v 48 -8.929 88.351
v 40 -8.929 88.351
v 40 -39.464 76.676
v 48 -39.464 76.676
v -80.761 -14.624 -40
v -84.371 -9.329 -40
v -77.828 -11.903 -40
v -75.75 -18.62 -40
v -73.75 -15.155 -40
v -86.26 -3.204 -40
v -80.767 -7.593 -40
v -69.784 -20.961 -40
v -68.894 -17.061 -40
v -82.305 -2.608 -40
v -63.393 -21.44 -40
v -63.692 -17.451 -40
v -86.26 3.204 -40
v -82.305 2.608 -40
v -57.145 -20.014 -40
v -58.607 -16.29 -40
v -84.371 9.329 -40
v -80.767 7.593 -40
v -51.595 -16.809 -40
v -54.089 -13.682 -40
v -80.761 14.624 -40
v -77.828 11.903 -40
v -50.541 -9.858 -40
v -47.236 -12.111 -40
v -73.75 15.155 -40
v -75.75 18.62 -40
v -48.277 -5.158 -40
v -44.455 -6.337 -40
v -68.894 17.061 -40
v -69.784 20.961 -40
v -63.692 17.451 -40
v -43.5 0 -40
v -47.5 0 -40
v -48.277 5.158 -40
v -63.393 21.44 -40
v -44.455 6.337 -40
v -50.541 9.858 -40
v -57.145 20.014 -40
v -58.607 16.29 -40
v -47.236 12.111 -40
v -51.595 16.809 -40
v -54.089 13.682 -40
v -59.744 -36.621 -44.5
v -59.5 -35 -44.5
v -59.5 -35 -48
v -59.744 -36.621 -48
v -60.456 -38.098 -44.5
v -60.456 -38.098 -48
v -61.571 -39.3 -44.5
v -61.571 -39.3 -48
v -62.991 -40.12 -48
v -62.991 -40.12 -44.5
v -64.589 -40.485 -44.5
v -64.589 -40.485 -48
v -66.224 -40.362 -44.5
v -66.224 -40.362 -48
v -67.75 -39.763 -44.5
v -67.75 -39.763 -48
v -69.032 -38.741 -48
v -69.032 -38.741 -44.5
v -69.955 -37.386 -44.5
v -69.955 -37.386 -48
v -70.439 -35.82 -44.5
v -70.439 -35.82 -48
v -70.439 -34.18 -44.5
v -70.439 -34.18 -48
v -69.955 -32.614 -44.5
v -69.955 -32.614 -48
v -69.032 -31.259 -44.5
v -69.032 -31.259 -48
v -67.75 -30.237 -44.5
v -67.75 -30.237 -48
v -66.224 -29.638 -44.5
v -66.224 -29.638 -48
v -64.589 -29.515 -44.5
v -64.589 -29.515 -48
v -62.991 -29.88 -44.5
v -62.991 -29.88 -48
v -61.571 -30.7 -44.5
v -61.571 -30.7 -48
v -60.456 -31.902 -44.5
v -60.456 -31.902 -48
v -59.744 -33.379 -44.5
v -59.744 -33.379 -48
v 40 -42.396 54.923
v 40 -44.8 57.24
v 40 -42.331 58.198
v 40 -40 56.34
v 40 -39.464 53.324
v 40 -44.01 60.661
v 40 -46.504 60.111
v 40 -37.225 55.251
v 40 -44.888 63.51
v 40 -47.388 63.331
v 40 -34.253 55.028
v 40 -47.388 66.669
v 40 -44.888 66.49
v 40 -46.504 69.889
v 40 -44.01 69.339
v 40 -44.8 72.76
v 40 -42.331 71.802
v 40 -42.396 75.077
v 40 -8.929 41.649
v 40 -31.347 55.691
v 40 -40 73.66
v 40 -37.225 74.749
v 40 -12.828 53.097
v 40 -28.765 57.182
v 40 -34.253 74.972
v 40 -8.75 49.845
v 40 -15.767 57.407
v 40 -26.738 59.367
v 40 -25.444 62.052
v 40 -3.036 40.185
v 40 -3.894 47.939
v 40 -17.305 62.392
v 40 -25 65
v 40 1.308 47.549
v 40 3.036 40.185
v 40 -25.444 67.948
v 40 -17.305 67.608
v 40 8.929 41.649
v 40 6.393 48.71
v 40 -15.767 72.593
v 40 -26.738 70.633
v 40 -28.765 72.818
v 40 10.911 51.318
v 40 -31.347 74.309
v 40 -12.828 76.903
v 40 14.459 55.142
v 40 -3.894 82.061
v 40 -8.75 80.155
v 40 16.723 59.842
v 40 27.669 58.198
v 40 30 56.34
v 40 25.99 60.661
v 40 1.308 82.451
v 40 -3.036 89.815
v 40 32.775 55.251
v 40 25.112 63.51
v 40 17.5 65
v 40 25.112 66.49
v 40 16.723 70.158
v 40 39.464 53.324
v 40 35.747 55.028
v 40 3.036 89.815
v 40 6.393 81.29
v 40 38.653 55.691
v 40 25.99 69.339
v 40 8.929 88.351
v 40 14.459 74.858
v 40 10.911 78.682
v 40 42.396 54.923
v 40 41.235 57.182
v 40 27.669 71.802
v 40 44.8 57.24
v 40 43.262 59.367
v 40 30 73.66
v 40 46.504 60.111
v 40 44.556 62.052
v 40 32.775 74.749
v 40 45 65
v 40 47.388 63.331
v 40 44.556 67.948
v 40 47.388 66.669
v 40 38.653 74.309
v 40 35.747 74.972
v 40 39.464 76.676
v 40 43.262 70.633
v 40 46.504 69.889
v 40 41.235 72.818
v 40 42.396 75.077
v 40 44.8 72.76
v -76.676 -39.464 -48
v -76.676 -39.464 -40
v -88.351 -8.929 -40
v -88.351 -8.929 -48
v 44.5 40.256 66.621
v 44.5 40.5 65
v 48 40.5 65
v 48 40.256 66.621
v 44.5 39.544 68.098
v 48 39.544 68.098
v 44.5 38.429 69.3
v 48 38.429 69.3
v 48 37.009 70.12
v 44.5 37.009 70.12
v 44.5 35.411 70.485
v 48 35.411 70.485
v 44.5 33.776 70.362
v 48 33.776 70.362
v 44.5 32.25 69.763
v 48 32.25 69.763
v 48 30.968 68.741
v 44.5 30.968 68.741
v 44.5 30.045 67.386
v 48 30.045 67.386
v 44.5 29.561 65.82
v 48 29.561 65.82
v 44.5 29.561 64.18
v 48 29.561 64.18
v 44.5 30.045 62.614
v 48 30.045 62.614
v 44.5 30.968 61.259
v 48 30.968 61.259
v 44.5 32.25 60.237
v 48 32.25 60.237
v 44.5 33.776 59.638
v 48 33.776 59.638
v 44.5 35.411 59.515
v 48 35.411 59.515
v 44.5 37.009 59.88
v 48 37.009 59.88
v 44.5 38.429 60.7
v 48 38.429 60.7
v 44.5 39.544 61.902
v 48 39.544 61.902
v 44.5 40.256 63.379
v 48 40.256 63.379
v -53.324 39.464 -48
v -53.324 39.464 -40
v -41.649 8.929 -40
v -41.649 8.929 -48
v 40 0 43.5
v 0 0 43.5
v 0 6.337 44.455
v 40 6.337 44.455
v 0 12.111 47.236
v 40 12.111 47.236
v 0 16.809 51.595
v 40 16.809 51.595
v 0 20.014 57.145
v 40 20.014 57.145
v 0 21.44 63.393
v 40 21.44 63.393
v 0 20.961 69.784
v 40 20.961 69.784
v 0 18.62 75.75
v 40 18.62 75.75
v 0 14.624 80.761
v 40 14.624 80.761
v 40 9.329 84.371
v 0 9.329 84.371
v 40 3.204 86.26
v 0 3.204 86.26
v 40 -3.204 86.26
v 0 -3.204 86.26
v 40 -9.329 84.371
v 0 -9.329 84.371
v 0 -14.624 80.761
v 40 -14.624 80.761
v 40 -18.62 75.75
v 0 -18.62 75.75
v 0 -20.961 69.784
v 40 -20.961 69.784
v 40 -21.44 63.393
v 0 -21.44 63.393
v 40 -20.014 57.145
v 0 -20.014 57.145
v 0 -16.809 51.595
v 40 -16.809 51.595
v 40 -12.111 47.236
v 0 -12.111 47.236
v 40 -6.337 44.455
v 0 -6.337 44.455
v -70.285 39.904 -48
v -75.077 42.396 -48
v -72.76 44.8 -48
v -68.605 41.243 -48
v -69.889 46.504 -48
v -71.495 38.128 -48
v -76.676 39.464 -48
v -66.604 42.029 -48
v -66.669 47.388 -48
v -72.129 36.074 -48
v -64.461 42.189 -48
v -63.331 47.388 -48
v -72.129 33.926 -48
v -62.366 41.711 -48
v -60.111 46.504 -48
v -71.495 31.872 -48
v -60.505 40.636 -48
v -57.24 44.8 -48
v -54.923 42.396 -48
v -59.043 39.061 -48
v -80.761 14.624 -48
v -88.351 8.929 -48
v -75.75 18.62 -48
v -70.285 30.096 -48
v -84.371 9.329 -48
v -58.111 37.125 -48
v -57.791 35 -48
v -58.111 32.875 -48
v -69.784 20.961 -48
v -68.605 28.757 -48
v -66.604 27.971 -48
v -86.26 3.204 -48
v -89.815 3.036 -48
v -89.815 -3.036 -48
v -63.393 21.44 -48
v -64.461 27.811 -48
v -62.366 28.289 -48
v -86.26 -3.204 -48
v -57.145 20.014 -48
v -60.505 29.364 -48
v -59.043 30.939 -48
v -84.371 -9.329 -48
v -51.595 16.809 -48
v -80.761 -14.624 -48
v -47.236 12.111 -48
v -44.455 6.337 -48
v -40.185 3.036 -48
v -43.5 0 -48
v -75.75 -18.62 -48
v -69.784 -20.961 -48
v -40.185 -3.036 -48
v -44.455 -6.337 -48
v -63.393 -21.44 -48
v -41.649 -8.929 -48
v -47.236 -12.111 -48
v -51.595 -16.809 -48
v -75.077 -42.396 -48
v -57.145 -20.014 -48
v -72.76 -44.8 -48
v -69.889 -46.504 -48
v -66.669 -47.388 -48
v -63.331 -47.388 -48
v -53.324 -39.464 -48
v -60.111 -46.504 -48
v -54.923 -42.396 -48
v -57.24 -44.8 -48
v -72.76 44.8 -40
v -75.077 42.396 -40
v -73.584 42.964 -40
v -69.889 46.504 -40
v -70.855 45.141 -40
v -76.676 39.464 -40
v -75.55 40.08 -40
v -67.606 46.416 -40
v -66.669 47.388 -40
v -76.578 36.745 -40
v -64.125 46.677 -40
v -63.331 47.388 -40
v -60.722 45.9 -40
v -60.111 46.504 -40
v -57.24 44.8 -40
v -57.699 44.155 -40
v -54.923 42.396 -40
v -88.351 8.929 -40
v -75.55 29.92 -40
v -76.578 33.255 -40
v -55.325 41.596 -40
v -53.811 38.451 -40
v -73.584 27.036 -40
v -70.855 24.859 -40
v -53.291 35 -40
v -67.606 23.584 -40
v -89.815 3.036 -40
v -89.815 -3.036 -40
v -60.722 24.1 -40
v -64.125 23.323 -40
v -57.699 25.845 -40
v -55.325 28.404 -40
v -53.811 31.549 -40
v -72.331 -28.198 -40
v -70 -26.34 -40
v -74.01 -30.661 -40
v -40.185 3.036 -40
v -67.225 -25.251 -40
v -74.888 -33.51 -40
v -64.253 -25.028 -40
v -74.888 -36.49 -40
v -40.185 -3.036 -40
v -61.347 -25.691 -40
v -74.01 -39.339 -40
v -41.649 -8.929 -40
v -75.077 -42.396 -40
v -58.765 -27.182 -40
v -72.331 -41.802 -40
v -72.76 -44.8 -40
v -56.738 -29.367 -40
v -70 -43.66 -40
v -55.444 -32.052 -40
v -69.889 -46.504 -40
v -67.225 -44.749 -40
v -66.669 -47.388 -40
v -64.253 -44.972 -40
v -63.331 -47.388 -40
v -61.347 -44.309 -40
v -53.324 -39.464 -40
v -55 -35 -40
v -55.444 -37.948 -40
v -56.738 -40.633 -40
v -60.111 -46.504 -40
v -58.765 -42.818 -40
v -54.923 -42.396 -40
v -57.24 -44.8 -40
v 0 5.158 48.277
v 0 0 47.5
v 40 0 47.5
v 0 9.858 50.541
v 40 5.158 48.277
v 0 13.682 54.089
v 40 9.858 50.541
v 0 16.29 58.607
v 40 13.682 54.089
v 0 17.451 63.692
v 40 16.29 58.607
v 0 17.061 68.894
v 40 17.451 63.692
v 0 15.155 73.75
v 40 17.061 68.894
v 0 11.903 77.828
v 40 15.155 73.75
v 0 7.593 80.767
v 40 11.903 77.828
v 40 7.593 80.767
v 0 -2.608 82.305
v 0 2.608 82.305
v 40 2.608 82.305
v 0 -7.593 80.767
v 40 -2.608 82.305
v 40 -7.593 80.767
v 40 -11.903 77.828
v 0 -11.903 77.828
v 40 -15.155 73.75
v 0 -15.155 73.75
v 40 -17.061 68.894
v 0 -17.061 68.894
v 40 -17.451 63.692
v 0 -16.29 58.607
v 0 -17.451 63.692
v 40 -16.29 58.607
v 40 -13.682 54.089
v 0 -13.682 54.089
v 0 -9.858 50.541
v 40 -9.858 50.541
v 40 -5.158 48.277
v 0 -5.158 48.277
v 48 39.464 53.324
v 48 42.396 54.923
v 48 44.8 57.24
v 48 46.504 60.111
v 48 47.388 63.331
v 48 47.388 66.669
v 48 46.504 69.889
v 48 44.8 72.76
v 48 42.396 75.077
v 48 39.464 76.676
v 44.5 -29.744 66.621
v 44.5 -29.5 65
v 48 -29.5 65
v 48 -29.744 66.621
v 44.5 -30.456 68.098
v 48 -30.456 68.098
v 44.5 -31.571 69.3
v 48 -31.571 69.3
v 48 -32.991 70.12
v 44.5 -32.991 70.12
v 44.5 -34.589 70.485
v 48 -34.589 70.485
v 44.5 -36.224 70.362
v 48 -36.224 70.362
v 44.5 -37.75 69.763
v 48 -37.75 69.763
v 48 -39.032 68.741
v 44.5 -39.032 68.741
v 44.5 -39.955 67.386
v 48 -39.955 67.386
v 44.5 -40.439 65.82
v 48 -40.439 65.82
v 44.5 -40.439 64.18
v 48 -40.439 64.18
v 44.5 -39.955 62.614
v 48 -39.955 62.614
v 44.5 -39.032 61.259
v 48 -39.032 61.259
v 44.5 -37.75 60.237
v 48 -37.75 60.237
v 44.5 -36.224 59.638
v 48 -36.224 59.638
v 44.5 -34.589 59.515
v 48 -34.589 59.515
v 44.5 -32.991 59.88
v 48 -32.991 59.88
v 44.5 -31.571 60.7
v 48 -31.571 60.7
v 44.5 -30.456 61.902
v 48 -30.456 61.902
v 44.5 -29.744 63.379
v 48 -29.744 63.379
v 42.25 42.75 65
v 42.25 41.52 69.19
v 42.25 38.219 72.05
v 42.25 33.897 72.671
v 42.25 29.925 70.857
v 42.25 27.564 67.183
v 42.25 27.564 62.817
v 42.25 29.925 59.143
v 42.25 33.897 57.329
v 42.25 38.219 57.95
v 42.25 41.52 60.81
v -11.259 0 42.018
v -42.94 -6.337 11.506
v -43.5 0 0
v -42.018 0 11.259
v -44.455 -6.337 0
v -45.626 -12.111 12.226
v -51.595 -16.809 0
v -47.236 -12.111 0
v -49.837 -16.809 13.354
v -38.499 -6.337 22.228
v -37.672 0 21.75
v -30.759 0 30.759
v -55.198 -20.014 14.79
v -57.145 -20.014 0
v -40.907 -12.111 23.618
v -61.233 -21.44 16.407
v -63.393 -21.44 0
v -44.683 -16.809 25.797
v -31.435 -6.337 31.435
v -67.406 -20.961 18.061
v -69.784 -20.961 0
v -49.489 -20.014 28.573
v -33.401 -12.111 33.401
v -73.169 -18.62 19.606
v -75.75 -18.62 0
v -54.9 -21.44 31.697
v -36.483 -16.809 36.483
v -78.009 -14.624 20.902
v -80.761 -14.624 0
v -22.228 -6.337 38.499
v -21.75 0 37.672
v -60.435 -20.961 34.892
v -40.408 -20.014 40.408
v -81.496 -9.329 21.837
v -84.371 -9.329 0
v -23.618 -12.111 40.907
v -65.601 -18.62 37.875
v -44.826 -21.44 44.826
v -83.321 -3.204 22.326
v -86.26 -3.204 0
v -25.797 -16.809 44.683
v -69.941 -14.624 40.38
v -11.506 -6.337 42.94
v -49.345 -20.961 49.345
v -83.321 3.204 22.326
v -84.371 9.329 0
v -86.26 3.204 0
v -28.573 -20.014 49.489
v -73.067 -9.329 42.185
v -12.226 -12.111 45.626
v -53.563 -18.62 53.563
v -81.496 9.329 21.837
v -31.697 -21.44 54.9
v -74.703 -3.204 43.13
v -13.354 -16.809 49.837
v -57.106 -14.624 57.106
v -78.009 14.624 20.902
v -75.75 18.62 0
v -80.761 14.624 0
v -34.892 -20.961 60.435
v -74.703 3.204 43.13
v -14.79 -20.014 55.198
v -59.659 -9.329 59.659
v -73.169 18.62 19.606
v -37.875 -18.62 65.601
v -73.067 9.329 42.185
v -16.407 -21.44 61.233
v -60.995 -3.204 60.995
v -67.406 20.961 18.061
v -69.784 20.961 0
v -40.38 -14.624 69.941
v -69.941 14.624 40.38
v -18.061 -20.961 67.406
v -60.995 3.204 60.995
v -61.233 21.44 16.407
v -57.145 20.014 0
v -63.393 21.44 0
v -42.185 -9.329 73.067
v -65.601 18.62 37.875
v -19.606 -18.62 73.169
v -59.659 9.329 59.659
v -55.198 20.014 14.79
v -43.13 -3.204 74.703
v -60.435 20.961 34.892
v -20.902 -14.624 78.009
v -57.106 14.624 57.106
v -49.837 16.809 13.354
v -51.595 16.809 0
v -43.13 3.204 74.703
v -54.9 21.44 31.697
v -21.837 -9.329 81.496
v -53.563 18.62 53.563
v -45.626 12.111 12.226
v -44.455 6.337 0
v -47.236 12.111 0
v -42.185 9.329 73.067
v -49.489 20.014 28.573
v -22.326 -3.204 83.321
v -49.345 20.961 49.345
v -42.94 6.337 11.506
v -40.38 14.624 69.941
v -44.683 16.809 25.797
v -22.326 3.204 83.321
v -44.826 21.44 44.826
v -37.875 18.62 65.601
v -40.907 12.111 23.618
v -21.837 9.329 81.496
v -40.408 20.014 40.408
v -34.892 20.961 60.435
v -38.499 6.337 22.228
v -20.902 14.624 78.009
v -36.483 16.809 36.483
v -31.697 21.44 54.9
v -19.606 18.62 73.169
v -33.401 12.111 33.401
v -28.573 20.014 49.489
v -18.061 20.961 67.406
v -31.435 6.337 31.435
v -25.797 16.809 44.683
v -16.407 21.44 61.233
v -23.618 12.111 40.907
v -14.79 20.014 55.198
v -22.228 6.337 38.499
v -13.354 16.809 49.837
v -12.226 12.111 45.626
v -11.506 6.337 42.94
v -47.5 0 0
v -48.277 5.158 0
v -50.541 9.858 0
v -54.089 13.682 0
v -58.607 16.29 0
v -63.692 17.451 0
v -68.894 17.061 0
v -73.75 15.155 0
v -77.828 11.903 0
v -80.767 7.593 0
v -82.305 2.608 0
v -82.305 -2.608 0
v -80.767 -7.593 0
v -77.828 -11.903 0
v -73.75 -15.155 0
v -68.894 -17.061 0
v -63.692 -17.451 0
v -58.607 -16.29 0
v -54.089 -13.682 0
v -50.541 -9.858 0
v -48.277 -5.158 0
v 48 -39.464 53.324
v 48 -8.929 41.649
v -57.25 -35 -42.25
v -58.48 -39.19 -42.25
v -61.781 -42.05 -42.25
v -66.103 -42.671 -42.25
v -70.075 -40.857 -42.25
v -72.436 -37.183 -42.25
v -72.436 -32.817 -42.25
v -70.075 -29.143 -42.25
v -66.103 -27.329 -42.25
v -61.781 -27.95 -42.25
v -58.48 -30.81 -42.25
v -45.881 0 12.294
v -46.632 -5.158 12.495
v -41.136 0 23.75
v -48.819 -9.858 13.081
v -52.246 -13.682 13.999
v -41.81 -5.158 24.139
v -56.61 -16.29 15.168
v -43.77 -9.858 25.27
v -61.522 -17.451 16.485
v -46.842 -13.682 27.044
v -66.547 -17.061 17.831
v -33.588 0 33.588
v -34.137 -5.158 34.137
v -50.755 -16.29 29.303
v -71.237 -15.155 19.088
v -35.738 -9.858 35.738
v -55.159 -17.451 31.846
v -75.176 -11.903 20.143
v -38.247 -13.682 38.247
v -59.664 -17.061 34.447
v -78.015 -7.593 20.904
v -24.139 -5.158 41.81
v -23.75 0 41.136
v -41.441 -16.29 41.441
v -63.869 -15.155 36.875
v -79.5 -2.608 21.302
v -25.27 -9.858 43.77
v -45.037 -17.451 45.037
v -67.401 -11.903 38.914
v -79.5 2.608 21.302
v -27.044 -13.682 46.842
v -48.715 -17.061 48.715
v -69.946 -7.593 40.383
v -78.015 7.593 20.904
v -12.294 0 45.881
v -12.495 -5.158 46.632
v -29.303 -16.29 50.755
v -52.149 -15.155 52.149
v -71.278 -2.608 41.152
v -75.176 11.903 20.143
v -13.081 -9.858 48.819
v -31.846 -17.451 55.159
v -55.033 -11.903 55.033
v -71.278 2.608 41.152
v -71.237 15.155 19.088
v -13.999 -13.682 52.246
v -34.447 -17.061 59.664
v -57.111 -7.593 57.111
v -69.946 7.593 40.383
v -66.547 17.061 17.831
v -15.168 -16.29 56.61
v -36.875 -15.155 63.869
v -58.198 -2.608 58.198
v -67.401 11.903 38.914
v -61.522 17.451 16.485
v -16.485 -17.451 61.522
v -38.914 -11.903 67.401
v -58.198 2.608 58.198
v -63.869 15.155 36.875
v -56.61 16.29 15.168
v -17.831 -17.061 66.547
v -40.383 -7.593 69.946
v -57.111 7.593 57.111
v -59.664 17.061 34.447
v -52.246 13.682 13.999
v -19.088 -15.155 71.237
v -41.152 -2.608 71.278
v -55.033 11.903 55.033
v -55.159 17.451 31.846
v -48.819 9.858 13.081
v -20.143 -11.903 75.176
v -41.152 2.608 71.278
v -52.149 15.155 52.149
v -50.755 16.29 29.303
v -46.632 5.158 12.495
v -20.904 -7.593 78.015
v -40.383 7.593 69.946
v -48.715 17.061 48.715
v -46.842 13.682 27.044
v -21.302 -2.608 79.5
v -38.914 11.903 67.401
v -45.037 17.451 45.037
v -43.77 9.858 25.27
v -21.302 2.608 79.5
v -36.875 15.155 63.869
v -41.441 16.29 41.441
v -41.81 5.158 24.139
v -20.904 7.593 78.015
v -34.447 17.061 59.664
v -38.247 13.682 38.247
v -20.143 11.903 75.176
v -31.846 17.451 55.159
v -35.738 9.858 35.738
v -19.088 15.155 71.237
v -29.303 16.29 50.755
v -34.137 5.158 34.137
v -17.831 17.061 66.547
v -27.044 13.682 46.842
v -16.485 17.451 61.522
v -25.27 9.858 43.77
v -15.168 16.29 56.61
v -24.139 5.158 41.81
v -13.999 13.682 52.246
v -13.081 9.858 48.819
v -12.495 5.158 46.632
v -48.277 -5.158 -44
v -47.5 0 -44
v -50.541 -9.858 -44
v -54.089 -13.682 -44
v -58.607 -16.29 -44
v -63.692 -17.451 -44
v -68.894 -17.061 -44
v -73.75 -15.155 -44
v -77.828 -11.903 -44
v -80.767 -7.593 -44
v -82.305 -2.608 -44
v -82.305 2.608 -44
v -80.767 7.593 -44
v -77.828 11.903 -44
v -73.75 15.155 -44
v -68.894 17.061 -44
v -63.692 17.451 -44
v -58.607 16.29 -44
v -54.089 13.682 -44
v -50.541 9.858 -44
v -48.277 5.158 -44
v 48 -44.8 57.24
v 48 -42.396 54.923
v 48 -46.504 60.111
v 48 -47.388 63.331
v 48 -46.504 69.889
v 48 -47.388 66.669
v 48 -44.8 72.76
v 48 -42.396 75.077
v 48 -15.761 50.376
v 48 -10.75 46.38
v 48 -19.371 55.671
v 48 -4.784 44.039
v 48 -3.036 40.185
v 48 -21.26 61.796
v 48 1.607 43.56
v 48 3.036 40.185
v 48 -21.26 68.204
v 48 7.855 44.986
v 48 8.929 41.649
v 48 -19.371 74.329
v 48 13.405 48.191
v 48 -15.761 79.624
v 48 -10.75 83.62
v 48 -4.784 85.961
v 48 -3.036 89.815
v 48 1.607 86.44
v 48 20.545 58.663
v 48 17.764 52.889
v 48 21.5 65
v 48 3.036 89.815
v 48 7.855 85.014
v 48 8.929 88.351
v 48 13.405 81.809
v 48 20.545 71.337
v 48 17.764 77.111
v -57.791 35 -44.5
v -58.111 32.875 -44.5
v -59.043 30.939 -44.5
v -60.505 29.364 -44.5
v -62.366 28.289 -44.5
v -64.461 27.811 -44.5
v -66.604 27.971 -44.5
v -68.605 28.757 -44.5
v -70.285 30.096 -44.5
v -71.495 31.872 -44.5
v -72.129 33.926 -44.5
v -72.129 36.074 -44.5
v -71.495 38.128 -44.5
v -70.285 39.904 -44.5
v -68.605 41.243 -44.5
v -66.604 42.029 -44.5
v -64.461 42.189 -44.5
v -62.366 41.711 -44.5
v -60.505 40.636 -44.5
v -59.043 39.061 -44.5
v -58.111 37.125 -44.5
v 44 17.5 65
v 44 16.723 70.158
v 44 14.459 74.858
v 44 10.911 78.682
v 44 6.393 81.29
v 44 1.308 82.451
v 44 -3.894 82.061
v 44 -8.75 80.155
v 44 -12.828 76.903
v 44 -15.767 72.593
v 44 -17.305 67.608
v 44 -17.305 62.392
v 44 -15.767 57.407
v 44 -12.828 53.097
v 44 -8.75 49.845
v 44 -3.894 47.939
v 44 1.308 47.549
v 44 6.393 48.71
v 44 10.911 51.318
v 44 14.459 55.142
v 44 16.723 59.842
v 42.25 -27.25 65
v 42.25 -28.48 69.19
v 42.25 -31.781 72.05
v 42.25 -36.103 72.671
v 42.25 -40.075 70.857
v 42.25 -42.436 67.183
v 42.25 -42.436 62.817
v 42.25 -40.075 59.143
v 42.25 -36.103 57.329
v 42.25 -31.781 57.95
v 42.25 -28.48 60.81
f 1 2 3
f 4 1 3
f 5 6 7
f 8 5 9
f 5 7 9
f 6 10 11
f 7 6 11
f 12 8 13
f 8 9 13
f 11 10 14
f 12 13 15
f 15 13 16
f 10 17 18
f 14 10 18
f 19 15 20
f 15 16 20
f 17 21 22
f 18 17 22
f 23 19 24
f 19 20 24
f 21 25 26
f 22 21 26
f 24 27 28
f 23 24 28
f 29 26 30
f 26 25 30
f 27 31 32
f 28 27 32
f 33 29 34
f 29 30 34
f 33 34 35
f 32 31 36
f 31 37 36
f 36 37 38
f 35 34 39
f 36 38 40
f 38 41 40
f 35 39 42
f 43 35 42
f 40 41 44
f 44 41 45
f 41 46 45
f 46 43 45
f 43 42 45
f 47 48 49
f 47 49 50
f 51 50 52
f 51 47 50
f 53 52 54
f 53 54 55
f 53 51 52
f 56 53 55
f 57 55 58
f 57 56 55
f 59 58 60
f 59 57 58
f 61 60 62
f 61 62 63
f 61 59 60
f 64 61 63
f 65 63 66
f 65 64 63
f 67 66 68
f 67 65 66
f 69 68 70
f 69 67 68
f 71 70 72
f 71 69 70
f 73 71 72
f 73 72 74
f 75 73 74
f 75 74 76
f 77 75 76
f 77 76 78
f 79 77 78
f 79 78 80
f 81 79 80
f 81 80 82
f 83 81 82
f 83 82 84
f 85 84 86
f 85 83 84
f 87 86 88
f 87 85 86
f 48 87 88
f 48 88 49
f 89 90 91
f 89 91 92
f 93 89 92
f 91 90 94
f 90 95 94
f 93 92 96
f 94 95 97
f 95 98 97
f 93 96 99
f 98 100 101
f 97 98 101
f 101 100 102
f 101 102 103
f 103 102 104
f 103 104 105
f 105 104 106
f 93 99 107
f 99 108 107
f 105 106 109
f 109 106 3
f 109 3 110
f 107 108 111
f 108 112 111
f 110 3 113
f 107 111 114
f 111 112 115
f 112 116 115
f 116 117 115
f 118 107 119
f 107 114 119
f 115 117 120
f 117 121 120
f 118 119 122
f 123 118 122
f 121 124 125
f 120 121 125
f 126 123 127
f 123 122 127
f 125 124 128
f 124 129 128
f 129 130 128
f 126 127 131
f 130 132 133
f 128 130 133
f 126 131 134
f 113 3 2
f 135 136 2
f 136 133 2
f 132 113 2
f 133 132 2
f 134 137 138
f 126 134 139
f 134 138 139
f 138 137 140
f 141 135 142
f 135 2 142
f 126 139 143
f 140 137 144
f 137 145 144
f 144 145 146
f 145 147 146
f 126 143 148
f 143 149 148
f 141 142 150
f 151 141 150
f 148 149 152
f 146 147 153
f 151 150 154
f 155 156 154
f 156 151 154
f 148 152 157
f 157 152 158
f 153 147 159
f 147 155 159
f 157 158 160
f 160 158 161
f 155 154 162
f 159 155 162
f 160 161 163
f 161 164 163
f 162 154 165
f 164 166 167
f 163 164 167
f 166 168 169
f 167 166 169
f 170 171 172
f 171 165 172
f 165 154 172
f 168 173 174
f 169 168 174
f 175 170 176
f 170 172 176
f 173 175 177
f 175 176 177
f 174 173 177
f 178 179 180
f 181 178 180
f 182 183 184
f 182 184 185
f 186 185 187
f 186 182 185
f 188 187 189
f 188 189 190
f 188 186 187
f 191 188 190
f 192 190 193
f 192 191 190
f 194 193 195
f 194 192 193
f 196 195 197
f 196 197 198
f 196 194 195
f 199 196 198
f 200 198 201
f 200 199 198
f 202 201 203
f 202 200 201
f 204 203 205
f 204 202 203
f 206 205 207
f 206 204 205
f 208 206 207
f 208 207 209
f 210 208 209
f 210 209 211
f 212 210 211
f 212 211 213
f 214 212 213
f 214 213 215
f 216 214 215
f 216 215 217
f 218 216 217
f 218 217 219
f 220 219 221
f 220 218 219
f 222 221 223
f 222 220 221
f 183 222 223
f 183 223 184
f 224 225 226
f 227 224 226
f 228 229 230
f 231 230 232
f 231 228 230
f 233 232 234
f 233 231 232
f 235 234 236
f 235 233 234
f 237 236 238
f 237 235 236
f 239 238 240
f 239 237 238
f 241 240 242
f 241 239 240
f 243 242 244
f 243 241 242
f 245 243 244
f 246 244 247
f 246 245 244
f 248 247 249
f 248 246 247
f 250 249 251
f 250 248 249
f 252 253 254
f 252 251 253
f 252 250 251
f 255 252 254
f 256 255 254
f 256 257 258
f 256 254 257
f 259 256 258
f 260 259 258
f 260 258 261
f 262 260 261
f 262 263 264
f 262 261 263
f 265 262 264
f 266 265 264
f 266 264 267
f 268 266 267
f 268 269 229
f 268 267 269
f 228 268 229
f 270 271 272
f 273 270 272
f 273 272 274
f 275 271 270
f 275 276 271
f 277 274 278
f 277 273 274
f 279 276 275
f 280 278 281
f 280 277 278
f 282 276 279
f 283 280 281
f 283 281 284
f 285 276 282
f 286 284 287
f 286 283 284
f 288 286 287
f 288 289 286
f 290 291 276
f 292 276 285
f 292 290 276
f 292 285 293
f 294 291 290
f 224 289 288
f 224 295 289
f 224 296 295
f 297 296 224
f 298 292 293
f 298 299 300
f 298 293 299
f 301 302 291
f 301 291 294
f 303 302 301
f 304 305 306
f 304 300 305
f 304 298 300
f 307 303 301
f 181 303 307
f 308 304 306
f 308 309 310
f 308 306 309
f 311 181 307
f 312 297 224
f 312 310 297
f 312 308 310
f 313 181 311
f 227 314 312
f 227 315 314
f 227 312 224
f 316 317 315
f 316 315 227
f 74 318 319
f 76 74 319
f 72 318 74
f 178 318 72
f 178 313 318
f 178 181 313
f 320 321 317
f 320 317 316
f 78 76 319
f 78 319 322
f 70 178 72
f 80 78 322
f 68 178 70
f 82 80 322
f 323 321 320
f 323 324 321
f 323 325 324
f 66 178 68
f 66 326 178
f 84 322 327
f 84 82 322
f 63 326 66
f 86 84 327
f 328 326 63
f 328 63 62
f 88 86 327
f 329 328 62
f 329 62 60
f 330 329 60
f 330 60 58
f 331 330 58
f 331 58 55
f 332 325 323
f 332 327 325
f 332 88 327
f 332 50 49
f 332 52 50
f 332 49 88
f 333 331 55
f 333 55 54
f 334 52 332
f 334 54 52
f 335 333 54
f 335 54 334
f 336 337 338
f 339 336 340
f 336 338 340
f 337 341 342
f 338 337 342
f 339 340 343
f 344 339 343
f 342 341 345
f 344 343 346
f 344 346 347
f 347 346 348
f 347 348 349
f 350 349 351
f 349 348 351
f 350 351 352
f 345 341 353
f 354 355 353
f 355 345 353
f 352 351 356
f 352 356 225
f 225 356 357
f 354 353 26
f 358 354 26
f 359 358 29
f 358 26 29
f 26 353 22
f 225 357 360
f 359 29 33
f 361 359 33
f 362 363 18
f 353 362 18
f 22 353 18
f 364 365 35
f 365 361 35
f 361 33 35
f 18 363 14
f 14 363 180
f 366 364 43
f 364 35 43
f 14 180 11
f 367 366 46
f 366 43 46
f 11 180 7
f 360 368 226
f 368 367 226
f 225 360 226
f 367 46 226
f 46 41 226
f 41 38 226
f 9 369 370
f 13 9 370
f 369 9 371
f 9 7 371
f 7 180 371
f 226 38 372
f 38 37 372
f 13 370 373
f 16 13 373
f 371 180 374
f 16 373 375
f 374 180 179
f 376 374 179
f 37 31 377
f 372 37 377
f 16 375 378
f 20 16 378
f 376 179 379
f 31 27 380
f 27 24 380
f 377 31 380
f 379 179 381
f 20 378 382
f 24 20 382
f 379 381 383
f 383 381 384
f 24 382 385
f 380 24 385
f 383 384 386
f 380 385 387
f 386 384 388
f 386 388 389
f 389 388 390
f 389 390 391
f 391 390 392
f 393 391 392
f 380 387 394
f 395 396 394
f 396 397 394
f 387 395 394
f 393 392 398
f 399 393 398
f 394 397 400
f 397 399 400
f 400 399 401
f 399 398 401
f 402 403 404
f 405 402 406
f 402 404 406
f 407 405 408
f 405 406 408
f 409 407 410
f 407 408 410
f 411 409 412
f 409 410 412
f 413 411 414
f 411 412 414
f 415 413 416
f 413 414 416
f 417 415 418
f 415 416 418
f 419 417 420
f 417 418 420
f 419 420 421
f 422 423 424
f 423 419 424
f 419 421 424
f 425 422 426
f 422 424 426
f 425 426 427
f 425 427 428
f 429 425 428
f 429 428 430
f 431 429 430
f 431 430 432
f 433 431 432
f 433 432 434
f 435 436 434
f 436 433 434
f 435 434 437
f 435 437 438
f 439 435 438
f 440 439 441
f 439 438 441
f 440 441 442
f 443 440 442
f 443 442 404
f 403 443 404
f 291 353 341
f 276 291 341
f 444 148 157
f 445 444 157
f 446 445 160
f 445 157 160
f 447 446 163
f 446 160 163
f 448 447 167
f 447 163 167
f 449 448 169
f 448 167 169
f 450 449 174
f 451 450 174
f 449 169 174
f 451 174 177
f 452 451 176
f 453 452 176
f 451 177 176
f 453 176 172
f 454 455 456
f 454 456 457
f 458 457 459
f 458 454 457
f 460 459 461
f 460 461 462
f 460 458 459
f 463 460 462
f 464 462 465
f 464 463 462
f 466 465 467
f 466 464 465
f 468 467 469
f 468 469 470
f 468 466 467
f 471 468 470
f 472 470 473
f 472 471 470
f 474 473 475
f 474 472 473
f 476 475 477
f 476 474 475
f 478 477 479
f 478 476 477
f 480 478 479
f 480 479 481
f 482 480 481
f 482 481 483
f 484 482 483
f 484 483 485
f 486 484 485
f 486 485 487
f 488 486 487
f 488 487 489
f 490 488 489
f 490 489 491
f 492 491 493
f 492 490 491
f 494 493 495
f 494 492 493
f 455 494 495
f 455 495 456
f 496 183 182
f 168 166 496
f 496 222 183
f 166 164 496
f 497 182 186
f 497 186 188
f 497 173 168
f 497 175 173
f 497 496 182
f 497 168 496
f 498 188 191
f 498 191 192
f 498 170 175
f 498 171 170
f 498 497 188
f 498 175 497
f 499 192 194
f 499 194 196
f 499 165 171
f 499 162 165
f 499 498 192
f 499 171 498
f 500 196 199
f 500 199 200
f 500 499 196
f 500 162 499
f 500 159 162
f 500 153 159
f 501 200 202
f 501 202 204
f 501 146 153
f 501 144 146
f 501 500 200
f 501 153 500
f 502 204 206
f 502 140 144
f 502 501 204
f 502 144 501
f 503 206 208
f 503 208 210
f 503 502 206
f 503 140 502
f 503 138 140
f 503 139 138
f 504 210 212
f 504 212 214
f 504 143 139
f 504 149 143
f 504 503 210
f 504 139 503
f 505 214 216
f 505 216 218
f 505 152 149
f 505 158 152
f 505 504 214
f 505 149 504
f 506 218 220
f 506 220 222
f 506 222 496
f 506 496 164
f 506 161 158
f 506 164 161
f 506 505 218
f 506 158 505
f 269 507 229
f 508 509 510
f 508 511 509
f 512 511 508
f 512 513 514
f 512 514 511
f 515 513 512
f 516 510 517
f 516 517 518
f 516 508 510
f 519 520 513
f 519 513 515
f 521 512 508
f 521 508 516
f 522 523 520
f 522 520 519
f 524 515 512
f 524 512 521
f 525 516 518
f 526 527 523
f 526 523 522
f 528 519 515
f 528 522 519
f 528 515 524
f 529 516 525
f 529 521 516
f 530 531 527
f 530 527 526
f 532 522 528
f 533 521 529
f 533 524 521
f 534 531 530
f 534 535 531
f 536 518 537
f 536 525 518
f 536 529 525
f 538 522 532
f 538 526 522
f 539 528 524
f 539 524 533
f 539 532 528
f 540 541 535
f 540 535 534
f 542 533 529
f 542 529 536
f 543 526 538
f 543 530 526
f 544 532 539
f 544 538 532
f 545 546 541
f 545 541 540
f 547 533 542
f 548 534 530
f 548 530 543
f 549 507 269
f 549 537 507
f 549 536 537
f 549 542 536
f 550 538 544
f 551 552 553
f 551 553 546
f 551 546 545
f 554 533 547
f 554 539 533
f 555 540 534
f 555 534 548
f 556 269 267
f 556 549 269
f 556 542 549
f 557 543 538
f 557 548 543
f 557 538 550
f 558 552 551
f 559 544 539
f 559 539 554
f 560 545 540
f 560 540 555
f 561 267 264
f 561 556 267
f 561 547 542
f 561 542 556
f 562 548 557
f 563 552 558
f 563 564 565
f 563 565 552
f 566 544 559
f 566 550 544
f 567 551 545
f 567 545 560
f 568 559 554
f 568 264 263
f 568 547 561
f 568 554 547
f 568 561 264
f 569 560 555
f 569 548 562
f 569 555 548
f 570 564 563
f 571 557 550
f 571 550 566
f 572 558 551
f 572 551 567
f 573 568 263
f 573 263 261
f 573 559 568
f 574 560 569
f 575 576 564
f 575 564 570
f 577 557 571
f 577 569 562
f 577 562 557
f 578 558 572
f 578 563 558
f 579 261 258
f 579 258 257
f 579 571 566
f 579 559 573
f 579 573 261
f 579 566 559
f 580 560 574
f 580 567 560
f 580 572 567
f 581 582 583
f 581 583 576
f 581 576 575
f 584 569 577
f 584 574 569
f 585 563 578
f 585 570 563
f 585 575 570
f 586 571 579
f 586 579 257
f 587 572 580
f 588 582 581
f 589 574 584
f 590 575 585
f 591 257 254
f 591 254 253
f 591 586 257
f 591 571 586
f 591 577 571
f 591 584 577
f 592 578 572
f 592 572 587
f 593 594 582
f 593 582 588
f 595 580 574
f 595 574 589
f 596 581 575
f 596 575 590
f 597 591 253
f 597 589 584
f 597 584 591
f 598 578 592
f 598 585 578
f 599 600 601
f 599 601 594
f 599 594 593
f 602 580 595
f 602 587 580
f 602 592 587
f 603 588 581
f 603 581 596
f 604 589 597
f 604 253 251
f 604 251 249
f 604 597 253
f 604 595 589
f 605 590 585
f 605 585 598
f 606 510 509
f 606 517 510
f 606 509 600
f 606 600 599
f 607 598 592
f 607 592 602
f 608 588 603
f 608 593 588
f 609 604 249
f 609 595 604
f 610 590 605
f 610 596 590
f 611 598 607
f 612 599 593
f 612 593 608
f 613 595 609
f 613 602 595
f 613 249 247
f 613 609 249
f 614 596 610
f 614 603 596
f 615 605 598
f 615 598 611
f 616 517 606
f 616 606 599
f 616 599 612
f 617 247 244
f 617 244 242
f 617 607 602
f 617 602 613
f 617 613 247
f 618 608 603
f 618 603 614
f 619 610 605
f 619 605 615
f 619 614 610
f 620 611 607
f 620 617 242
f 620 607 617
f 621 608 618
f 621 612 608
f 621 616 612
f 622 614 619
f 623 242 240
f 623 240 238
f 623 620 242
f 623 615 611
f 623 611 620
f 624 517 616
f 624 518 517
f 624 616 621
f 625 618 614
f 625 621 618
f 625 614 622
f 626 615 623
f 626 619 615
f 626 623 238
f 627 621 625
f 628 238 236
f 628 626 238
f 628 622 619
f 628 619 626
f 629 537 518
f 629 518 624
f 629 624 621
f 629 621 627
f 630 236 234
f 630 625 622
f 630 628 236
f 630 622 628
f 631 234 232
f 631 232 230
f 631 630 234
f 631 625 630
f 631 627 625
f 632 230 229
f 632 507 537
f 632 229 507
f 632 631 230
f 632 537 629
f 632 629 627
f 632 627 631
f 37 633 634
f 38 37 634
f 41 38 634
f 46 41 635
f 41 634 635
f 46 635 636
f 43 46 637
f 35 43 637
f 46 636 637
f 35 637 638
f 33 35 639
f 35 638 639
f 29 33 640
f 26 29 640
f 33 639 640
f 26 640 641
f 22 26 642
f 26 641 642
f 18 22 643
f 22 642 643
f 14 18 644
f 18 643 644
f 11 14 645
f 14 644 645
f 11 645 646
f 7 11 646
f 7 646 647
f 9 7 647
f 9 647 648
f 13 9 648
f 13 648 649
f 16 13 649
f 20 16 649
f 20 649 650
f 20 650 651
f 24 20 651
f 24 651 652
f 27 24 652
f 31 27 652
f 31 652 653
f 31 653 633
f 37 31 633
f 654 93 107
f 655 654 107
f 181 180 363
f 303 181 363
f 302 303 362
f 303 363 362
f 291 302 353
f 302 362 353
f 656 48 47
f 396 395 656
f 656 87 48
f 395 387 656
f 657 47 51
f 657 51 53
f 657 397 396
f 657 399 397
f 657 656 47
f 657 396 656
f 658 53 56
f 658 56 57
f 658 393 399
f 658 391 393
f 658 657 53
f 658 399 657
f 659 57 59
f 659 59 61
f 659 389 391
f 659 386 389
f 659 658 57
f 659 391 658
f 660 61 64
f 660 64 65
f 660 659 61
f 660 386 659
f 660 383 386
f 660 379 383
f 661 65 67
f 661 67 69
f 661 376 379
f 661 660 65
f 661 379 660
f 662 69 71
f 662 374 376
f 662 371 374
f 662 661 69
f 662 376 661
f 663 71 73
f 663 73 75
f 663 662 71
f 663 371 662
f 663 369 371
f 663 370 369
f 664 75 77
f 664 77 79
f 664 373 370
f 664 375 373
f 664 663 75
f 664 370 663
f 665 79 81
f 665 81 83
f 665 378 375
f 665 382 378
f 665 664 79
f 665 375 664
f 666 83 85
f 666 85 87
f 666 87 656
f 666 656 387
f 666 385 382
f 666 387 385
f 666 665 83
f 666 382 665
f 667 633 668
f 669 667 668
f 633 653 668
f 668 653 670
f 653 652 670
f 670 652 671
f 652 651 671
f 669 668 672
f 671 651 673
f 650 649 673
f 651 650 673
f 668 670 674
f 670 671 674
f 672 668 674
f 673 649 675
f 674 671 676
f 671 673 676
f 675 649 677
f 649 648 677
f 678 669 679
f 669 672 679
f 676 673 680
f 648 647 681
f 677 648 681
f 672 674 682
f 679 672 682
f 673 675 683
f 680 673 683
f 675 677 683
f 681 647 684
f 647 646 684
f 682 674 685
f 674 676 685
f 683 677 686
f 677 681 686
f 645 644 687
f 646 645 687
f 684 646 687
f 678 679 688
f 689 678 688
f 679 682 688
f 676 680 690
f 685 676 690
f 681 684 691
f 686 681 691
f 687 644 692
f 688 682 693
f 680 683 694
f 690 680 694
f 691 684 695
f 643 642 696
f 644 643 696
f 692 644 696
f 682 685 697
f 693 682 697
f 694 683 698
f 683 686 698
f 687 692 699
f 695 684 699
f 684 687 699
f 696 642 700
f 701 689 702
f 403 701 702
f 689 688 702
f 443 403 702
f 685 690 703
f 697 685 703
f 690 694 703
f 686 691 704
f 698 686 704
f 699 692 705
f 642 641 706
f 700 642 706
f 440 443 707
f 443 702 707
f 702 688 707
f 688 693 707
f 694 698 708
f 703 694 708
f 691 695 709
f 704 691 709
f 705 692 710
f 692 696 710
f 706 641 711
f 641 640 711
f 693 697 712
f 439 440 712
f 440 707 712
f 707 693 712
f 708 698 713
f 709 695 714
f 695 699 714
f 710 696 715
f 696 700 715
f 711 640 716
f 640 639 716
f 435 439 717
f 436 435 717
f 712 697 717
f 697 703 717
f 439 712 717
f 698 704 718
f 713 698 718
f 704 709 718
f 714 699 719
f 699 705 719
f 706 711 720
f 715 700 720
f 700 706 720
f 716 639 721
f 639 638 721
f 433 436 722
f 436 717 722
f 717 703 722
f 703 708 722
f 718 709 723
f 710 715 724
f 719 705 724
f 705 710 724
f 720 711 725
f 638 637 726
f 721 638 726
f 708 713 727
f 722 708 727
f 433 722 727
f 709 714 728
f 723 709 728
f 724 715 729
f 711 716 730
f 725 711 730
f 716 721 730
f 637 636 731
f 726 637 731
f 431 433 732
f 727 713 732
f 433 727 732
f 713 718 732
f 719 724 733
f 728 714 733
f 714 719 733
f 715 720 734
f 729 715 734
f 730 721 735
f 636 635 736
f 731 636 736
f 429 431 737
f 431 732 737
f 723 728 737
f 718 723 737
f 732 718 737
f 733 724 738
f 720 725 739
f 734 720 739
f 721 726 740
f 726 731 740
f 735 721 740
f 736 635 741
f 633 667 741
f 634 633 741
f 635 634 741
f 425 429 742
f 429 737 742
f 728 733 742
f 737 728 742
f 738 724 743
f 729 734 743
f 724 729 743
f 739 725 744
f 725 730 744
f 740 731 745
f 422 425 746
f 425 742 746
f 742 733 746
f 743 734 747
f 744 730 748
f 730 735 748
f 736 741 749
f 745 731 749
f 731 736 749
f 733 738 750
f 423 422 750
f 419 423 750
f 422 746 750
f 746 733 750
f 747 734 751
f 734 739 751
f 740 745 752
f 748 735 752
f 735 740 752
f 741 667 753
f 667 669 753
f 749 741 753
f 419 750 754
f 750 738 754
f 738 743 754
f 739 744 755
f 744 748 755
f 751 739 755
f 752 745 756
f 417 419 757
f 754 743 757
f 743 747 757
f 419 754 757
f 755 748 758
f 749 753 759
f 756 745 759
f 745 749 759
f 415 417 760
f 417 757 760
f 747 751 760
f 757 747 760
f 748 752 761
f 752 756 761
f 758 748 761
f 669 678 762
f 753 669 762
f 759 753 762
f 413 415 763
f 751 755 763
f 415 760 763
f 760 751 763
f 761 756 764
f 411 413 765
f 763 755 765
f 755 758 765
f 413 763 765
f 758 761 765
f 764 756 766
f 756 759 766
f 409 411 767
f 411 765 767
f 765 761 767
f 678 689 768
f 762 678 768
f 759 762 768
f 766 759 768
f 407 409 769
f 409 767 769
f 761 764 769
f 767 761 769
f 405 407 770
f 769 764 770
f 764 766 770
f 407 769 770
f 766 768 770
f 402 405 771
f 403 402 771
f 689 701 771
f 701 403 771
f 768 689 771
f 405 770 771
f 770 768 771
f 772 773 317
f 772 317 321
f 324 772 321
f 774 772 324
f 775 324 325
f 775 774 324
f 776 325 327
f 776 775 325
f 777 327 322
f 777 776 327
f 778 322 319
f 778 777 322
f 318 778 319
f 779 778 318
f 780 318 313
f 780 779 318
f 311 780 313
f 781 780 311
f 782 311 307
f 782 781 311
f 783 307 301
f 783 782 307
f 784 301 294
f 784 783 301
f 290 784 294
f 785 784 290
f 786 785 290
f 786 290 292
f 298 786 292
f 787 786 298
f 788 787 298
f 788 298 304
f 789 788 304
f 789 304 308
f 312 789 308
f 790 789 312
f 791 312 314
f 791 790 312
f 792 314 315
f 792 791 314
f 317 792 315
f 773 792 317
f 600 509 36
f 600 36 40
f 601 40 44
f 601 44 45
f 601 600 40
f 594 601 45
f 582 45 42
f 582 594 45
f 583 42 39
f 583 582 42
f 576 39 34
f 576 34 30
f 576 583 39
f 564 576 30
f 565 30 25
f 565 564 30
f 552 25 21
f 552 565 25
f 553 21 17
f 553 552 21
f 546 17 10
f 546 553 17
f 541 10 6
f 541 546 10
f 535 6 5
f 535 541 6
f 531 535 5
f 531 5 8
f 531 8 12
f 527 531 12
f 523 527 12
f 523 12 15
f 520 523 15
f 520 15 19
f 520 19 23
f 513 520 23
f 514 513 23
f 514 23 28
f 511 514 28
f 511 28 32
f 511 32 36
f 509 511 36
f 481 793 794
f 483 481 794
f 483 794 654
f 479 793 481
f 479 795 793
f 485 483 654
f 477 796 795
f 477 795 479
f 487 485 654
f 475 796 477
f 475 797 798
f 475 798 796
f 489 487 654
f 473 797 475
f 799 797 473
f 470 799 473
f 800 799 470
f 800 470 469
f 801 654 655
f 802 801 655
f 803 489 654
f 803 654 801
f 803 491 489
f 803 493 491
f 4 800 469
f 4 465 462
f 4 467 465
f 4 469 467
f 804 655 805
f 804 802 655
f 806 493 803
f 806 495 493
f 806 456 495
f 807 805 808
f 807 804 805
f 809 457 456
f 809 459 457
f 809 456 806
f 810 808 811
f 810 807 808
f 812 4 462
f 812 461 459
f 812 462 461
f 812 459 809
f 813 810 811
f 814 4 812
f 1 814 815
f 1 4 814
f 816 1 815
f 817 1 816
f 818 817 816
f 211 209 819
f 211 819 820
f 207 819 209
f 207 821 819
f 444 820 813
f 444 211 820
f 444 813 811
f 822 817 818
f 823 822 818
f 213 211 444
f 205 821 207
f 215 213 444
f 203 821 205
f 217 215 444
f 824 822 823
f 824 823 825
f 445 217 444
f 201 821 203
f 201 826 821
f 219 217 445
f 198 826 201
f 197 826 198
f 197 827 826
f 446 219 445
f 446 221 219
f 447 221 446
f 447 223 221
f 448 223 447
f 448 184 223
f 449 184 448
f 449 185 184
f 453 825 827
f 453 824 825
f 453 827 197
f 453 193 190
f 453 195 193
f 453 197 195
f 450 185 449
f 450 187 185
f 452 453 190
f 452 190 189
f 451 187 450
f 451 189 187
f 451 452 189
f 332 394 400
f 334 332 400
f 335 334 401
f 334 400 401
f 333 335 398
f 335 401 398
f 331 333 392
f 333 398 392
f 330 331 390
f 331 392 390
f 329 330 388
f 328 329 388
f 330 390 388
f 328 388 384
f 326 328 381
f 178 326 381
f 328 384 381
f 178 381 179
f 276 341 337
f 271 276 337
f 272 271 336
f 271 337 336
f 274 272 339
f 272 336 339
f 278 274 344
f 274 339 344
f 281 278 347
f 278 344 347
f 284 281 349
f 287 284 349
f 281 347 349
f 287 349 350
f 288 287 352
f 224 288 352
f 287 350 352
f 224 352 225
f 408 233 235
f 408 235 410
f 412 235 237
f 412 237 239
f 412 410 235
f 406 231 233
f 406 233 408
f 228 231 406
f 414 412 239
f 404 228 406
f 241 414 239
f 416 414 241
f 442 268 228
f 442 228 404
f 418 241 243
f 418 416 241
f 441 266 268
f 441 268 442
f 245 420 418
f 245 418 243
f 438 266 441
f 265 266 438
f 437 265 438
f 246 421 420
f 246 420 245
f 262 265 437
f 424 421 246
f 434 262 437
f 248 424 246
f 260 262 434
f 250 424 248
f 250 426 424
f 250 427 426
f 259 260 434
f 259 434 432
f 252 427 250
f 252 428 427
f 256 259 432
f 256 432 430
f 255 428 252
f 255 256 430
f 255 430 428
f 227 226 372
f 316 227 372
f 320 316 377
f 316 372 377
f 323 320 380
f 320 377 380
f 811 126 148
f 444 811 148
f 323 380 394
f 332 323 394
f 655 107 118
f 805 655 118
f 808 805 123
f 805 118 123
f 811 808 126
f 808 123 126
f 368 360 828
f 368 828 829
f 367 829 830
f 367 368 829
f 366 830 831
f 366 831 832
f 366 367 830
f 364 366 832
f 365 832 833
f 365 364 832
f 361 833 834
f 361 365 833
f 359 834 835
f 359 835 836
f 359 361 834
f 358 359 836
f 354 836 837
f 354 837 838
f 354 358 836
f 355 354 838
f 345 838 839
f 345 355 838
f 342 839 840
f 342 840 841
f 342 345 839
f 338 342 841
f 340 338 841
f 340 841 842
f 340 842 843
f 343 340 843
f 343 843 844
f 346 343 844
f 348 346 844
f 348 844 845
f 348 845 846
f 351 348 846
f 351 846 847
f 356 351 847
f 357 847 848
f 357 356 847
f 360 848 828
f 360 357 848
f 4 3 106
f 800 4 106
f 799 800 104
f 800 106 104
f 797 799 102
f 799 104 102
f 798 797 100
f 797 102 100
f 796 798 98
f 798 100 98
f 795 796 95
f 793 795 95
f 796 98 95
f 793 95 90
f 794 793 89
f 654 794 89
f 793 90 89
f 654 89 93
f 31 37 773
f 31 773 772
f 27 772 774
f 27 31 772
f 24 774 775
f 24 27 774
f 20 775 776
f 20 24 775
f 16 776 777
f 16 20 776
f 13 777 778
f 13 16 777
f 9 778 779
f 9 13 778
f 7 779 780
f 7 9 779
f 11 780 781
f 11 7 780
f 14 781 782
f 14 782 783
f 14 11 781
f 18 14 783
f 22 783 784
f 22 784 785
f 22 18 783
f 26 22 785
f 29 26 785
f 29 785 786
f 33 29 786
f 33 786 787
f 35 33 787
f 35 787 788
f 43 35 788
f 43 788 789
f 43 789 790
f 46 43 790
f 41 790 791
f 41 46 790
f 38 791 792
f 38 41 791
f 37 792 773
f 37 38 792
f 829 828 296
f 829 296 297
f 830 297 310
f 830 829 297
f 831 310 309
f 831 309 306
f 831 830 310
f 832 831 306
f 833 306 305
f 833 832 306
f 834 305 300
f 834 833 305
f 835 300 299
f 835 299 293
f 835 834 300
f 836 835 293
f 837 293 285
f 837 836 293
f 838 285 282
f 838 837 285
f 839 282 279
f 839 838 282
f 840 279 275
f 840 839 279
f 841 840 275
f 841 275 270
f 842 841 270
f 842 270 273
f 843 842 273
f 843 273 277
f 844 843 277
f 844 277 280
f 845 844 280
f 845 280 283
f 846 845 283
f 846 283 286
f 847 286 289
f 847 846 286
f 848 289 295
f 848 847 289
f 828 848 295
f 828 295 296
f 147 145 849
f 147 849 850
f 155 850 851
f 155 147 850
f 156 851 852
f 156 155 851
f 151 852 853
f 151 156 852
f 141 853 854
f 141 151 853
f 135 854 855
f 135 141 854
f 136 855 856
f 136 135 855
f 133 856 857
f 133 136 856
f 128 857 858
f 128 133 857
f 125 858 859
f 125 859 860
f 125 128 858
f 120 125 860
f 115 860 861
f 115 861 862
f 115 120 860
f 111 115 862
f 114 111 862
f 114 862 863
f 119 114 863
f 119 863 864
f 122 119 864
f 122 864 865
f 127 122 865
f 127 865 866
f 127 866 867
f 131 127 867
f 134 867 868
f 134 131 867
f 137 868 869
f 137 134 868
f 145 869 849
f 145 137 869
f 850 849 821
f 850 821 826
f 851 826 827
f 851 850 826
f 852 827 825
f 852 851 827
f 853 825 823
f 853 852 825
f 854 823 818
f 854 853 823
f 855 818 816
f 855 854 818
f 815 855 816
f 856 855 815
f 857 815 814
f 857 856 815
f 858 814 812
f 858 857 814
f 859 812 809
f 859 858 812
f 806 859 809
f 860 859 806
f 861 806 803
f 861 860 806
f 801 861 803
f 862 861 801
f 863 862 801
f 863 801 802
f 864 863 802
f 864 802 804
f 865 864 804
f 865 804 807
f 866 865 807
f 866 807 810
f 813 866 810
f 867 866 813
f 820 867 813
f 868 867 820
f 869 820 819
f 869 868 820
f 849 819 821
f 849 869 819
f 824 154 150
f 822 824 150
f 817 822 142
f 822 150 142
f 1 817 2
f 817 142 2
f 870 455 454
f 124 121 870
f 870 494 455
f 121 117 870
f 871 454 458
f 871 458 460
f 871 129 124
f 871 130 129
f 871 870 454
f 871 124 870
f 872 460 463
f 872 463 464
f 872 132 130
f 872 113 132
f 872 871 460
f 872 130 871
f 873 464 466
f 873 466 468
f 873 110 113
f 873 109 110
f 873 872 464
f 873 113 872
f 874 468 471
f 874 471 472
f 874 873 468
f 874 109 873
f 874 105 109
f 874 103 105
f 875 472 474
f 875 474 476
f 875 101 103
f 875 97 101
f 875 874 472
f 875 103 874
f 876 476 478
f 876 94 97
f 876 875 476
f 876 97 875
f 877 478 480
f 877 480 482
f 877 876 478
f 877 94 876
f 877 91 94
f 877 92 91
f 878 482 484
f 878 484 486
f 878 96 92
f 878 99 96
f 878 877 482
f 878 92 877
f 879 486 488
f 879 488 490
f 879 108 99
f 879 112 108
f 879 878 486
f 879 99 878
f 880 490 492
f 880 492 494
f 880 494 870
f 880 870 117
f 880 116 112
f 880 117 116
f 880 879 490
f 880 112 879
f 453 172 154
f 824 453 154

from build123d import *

# Parameters (mm, degrees)
F1_R      = 21.5
F1_R_2    = 17.5
F3_R      = 7.2092670895
F3_R_2    = 21.5
F3_R_3    = 5.5
F3_R_4    = 17.5
F4_DEPTH  = 8
F5_R      = 5.5
F5_R_2    = 21.5
F5_R_3    = 17.5
F6_DEPTH  = 8
F7_SIZE   = 4.5
F7_2_SIZE = 4.5
F8_SIZE   = 4
F8_2_SIZE = 4


with BuildPart() as f2:
    # F2: sweep along a path in F0
    with BuildLine(Plane.XZ) as f2_path:
        Line((-65, -40), (-65, 0))
        ThreePointArc((-65, 0), (-45.9619407771, 45.9619407771), (0, 65))
        Line((0, 65), (40, 65))
    # F1 (on Top) → F2 (sweep)
    with BuildSketch(Plane.XY):
        with Locations((-65, 0)):
            Circle(F1_R)
        with Locations((-65, 0)):
            Circle(F1_R_2, mode=Mode.SUBTRACT)
    sweep(path=f2_path.line)


with BuildPart() as f4:
    # F3 (on face) → F4 (new body)
    with BuildSketch(Plane(origin=(0, 0, -40), x_dir=(1, 0, 0), z_dir=(0, 0, -1))):
        with BuildLine():
            Line((-76.6756221702, 39.4642857143), (-88.3512443404, 8.9285714286))
            ThreePointArc((-88.3512443404, 8.9285714286), (-90, 0), (-88.3512443404, -8.9285714286))
            Line((-88.3512443404, -8.9285714286), (-76.6756221702, -39.4642857143))
            ThreePointArc((-76.6756221702, -39.4642857143), (-65, -47.5), (-53.3243778298, -39.4642857143))
            Line((-53.3243778298, -39.4642857143), (-41.6487556596, -8.9285714286))
            ThreePointArc((-41.6487556596, -8.9285714286), (-40, 0), (-41.6487556596, 8.9285714286))
            Line((-41.6487556596, 8.9285714286), (-53.3243778298, 39.4642857143))
            ThreePointArc((-53.3243778298, 39.4642857143), (-65, 47.5), (-76.6756221702, 39.4642857143))
        make_face()
        with Locations((-65, -35)):
            Circle(F3_R, mode=Mode.SUBTRACT)
        with Locations((-65, 0)):
            Circle(F3_R_2, mode=Mode.SUBTRACT)
        with Locations((-65, 35)):
            Circle(F3_R_3, mode=Mode.SUBTRACT)
        with Locations((-65, 0)):
            Circle(F3_R_2)
        with Locations((-65, 0)):
            Circle(F3_R_4, mode=Mode.SUBTRACT)
    extrude(amount=F4_DEPTH)

    # F7
    f7_edges = [f4.edges().sort_by_distance(p)[0] for p in [
        (-72.209267, 35, -40),
        (-70.5, -35, -40),
    ]]
    chamfer(f7_edges, length=F7_SIZE)

    # F8
    f8_edges = [f4.edges().sort_by_distance(p)[0] for p in [
        (-82.5, 0, -48),
    ]]
    chamfer(f8_edges, length=F8_SIZE)


with BuildPart() as f6:
    # F5 (on face) → F6 (new body)
    with BuildSketch(Plane.YZ.offset(40)):
        with BuildLine():
            Line((39.4642857143, 76.6756221702), (8.9285714286, 88.3512443404))
            ThreePointArc((8.9285714286, 88.3512443404), (0, 90), (-8.9285714286, 88.3512443404))
            Line((-8.9285714286, 88.3512443404), (-39.4642857143, 76.6756221702))
            ThreePointArc((-39.4642857143, 76.6756221702), (-47.5, 65), (-39.4642857143, 53.3243778298))
            Line((-39.4642857143, 53.3243778298), (-8.9285714286, 41.6487556596))
            ThreePointArc((-8.9285714286, 41.6487556596), (0, 40), (8.9285714286, 41.6487556596))
            Line((8.9285714286, 41.6487556596), (39.4642857143, 53.3243778298))
            ThreePointArc((39.4642857143, 53.3243778298), (47.5, 65), (39.4642857143, 76.6756221702))
        make_face()
        with Locations((-35, 65)):
            Circle(F5_R, mode=Mode.SUBTRACT)
        with Locations((0, 65)):
            Circle(F5_R_2, mode=Mode.SUBTRACT)
        with Locations((35, 65)):
            Circle(F5_R, mode=Mode.SUBTRACT)
        with Locations((0, 65)):
            Circle(F5_R_2)
        with Locations((0, 65)):
            Circle(F5_R_3, mode=Mode.SUBTRACT)
    extrude(amount=F6_DEPTH)

    # F7#2
    f7_2_edges = [f6.edges().sort_by_distance(p)[0] for p in [
        (40, 29.5, 65),
        (40, -40.5, 65),
    ]]
    chamfer(f7_2_edges, length=F7_2_SIZE)

    # F8#2
    f8_2_edges = [f6.edges().sort_by_distance(p)[0] for p in [
        (48, -17.5, 65),
    ]]
    chamfer(f8_2_edges, length=F8_2_SIZE)


solid = Compound([f2.part, f4.part, f6.part])
